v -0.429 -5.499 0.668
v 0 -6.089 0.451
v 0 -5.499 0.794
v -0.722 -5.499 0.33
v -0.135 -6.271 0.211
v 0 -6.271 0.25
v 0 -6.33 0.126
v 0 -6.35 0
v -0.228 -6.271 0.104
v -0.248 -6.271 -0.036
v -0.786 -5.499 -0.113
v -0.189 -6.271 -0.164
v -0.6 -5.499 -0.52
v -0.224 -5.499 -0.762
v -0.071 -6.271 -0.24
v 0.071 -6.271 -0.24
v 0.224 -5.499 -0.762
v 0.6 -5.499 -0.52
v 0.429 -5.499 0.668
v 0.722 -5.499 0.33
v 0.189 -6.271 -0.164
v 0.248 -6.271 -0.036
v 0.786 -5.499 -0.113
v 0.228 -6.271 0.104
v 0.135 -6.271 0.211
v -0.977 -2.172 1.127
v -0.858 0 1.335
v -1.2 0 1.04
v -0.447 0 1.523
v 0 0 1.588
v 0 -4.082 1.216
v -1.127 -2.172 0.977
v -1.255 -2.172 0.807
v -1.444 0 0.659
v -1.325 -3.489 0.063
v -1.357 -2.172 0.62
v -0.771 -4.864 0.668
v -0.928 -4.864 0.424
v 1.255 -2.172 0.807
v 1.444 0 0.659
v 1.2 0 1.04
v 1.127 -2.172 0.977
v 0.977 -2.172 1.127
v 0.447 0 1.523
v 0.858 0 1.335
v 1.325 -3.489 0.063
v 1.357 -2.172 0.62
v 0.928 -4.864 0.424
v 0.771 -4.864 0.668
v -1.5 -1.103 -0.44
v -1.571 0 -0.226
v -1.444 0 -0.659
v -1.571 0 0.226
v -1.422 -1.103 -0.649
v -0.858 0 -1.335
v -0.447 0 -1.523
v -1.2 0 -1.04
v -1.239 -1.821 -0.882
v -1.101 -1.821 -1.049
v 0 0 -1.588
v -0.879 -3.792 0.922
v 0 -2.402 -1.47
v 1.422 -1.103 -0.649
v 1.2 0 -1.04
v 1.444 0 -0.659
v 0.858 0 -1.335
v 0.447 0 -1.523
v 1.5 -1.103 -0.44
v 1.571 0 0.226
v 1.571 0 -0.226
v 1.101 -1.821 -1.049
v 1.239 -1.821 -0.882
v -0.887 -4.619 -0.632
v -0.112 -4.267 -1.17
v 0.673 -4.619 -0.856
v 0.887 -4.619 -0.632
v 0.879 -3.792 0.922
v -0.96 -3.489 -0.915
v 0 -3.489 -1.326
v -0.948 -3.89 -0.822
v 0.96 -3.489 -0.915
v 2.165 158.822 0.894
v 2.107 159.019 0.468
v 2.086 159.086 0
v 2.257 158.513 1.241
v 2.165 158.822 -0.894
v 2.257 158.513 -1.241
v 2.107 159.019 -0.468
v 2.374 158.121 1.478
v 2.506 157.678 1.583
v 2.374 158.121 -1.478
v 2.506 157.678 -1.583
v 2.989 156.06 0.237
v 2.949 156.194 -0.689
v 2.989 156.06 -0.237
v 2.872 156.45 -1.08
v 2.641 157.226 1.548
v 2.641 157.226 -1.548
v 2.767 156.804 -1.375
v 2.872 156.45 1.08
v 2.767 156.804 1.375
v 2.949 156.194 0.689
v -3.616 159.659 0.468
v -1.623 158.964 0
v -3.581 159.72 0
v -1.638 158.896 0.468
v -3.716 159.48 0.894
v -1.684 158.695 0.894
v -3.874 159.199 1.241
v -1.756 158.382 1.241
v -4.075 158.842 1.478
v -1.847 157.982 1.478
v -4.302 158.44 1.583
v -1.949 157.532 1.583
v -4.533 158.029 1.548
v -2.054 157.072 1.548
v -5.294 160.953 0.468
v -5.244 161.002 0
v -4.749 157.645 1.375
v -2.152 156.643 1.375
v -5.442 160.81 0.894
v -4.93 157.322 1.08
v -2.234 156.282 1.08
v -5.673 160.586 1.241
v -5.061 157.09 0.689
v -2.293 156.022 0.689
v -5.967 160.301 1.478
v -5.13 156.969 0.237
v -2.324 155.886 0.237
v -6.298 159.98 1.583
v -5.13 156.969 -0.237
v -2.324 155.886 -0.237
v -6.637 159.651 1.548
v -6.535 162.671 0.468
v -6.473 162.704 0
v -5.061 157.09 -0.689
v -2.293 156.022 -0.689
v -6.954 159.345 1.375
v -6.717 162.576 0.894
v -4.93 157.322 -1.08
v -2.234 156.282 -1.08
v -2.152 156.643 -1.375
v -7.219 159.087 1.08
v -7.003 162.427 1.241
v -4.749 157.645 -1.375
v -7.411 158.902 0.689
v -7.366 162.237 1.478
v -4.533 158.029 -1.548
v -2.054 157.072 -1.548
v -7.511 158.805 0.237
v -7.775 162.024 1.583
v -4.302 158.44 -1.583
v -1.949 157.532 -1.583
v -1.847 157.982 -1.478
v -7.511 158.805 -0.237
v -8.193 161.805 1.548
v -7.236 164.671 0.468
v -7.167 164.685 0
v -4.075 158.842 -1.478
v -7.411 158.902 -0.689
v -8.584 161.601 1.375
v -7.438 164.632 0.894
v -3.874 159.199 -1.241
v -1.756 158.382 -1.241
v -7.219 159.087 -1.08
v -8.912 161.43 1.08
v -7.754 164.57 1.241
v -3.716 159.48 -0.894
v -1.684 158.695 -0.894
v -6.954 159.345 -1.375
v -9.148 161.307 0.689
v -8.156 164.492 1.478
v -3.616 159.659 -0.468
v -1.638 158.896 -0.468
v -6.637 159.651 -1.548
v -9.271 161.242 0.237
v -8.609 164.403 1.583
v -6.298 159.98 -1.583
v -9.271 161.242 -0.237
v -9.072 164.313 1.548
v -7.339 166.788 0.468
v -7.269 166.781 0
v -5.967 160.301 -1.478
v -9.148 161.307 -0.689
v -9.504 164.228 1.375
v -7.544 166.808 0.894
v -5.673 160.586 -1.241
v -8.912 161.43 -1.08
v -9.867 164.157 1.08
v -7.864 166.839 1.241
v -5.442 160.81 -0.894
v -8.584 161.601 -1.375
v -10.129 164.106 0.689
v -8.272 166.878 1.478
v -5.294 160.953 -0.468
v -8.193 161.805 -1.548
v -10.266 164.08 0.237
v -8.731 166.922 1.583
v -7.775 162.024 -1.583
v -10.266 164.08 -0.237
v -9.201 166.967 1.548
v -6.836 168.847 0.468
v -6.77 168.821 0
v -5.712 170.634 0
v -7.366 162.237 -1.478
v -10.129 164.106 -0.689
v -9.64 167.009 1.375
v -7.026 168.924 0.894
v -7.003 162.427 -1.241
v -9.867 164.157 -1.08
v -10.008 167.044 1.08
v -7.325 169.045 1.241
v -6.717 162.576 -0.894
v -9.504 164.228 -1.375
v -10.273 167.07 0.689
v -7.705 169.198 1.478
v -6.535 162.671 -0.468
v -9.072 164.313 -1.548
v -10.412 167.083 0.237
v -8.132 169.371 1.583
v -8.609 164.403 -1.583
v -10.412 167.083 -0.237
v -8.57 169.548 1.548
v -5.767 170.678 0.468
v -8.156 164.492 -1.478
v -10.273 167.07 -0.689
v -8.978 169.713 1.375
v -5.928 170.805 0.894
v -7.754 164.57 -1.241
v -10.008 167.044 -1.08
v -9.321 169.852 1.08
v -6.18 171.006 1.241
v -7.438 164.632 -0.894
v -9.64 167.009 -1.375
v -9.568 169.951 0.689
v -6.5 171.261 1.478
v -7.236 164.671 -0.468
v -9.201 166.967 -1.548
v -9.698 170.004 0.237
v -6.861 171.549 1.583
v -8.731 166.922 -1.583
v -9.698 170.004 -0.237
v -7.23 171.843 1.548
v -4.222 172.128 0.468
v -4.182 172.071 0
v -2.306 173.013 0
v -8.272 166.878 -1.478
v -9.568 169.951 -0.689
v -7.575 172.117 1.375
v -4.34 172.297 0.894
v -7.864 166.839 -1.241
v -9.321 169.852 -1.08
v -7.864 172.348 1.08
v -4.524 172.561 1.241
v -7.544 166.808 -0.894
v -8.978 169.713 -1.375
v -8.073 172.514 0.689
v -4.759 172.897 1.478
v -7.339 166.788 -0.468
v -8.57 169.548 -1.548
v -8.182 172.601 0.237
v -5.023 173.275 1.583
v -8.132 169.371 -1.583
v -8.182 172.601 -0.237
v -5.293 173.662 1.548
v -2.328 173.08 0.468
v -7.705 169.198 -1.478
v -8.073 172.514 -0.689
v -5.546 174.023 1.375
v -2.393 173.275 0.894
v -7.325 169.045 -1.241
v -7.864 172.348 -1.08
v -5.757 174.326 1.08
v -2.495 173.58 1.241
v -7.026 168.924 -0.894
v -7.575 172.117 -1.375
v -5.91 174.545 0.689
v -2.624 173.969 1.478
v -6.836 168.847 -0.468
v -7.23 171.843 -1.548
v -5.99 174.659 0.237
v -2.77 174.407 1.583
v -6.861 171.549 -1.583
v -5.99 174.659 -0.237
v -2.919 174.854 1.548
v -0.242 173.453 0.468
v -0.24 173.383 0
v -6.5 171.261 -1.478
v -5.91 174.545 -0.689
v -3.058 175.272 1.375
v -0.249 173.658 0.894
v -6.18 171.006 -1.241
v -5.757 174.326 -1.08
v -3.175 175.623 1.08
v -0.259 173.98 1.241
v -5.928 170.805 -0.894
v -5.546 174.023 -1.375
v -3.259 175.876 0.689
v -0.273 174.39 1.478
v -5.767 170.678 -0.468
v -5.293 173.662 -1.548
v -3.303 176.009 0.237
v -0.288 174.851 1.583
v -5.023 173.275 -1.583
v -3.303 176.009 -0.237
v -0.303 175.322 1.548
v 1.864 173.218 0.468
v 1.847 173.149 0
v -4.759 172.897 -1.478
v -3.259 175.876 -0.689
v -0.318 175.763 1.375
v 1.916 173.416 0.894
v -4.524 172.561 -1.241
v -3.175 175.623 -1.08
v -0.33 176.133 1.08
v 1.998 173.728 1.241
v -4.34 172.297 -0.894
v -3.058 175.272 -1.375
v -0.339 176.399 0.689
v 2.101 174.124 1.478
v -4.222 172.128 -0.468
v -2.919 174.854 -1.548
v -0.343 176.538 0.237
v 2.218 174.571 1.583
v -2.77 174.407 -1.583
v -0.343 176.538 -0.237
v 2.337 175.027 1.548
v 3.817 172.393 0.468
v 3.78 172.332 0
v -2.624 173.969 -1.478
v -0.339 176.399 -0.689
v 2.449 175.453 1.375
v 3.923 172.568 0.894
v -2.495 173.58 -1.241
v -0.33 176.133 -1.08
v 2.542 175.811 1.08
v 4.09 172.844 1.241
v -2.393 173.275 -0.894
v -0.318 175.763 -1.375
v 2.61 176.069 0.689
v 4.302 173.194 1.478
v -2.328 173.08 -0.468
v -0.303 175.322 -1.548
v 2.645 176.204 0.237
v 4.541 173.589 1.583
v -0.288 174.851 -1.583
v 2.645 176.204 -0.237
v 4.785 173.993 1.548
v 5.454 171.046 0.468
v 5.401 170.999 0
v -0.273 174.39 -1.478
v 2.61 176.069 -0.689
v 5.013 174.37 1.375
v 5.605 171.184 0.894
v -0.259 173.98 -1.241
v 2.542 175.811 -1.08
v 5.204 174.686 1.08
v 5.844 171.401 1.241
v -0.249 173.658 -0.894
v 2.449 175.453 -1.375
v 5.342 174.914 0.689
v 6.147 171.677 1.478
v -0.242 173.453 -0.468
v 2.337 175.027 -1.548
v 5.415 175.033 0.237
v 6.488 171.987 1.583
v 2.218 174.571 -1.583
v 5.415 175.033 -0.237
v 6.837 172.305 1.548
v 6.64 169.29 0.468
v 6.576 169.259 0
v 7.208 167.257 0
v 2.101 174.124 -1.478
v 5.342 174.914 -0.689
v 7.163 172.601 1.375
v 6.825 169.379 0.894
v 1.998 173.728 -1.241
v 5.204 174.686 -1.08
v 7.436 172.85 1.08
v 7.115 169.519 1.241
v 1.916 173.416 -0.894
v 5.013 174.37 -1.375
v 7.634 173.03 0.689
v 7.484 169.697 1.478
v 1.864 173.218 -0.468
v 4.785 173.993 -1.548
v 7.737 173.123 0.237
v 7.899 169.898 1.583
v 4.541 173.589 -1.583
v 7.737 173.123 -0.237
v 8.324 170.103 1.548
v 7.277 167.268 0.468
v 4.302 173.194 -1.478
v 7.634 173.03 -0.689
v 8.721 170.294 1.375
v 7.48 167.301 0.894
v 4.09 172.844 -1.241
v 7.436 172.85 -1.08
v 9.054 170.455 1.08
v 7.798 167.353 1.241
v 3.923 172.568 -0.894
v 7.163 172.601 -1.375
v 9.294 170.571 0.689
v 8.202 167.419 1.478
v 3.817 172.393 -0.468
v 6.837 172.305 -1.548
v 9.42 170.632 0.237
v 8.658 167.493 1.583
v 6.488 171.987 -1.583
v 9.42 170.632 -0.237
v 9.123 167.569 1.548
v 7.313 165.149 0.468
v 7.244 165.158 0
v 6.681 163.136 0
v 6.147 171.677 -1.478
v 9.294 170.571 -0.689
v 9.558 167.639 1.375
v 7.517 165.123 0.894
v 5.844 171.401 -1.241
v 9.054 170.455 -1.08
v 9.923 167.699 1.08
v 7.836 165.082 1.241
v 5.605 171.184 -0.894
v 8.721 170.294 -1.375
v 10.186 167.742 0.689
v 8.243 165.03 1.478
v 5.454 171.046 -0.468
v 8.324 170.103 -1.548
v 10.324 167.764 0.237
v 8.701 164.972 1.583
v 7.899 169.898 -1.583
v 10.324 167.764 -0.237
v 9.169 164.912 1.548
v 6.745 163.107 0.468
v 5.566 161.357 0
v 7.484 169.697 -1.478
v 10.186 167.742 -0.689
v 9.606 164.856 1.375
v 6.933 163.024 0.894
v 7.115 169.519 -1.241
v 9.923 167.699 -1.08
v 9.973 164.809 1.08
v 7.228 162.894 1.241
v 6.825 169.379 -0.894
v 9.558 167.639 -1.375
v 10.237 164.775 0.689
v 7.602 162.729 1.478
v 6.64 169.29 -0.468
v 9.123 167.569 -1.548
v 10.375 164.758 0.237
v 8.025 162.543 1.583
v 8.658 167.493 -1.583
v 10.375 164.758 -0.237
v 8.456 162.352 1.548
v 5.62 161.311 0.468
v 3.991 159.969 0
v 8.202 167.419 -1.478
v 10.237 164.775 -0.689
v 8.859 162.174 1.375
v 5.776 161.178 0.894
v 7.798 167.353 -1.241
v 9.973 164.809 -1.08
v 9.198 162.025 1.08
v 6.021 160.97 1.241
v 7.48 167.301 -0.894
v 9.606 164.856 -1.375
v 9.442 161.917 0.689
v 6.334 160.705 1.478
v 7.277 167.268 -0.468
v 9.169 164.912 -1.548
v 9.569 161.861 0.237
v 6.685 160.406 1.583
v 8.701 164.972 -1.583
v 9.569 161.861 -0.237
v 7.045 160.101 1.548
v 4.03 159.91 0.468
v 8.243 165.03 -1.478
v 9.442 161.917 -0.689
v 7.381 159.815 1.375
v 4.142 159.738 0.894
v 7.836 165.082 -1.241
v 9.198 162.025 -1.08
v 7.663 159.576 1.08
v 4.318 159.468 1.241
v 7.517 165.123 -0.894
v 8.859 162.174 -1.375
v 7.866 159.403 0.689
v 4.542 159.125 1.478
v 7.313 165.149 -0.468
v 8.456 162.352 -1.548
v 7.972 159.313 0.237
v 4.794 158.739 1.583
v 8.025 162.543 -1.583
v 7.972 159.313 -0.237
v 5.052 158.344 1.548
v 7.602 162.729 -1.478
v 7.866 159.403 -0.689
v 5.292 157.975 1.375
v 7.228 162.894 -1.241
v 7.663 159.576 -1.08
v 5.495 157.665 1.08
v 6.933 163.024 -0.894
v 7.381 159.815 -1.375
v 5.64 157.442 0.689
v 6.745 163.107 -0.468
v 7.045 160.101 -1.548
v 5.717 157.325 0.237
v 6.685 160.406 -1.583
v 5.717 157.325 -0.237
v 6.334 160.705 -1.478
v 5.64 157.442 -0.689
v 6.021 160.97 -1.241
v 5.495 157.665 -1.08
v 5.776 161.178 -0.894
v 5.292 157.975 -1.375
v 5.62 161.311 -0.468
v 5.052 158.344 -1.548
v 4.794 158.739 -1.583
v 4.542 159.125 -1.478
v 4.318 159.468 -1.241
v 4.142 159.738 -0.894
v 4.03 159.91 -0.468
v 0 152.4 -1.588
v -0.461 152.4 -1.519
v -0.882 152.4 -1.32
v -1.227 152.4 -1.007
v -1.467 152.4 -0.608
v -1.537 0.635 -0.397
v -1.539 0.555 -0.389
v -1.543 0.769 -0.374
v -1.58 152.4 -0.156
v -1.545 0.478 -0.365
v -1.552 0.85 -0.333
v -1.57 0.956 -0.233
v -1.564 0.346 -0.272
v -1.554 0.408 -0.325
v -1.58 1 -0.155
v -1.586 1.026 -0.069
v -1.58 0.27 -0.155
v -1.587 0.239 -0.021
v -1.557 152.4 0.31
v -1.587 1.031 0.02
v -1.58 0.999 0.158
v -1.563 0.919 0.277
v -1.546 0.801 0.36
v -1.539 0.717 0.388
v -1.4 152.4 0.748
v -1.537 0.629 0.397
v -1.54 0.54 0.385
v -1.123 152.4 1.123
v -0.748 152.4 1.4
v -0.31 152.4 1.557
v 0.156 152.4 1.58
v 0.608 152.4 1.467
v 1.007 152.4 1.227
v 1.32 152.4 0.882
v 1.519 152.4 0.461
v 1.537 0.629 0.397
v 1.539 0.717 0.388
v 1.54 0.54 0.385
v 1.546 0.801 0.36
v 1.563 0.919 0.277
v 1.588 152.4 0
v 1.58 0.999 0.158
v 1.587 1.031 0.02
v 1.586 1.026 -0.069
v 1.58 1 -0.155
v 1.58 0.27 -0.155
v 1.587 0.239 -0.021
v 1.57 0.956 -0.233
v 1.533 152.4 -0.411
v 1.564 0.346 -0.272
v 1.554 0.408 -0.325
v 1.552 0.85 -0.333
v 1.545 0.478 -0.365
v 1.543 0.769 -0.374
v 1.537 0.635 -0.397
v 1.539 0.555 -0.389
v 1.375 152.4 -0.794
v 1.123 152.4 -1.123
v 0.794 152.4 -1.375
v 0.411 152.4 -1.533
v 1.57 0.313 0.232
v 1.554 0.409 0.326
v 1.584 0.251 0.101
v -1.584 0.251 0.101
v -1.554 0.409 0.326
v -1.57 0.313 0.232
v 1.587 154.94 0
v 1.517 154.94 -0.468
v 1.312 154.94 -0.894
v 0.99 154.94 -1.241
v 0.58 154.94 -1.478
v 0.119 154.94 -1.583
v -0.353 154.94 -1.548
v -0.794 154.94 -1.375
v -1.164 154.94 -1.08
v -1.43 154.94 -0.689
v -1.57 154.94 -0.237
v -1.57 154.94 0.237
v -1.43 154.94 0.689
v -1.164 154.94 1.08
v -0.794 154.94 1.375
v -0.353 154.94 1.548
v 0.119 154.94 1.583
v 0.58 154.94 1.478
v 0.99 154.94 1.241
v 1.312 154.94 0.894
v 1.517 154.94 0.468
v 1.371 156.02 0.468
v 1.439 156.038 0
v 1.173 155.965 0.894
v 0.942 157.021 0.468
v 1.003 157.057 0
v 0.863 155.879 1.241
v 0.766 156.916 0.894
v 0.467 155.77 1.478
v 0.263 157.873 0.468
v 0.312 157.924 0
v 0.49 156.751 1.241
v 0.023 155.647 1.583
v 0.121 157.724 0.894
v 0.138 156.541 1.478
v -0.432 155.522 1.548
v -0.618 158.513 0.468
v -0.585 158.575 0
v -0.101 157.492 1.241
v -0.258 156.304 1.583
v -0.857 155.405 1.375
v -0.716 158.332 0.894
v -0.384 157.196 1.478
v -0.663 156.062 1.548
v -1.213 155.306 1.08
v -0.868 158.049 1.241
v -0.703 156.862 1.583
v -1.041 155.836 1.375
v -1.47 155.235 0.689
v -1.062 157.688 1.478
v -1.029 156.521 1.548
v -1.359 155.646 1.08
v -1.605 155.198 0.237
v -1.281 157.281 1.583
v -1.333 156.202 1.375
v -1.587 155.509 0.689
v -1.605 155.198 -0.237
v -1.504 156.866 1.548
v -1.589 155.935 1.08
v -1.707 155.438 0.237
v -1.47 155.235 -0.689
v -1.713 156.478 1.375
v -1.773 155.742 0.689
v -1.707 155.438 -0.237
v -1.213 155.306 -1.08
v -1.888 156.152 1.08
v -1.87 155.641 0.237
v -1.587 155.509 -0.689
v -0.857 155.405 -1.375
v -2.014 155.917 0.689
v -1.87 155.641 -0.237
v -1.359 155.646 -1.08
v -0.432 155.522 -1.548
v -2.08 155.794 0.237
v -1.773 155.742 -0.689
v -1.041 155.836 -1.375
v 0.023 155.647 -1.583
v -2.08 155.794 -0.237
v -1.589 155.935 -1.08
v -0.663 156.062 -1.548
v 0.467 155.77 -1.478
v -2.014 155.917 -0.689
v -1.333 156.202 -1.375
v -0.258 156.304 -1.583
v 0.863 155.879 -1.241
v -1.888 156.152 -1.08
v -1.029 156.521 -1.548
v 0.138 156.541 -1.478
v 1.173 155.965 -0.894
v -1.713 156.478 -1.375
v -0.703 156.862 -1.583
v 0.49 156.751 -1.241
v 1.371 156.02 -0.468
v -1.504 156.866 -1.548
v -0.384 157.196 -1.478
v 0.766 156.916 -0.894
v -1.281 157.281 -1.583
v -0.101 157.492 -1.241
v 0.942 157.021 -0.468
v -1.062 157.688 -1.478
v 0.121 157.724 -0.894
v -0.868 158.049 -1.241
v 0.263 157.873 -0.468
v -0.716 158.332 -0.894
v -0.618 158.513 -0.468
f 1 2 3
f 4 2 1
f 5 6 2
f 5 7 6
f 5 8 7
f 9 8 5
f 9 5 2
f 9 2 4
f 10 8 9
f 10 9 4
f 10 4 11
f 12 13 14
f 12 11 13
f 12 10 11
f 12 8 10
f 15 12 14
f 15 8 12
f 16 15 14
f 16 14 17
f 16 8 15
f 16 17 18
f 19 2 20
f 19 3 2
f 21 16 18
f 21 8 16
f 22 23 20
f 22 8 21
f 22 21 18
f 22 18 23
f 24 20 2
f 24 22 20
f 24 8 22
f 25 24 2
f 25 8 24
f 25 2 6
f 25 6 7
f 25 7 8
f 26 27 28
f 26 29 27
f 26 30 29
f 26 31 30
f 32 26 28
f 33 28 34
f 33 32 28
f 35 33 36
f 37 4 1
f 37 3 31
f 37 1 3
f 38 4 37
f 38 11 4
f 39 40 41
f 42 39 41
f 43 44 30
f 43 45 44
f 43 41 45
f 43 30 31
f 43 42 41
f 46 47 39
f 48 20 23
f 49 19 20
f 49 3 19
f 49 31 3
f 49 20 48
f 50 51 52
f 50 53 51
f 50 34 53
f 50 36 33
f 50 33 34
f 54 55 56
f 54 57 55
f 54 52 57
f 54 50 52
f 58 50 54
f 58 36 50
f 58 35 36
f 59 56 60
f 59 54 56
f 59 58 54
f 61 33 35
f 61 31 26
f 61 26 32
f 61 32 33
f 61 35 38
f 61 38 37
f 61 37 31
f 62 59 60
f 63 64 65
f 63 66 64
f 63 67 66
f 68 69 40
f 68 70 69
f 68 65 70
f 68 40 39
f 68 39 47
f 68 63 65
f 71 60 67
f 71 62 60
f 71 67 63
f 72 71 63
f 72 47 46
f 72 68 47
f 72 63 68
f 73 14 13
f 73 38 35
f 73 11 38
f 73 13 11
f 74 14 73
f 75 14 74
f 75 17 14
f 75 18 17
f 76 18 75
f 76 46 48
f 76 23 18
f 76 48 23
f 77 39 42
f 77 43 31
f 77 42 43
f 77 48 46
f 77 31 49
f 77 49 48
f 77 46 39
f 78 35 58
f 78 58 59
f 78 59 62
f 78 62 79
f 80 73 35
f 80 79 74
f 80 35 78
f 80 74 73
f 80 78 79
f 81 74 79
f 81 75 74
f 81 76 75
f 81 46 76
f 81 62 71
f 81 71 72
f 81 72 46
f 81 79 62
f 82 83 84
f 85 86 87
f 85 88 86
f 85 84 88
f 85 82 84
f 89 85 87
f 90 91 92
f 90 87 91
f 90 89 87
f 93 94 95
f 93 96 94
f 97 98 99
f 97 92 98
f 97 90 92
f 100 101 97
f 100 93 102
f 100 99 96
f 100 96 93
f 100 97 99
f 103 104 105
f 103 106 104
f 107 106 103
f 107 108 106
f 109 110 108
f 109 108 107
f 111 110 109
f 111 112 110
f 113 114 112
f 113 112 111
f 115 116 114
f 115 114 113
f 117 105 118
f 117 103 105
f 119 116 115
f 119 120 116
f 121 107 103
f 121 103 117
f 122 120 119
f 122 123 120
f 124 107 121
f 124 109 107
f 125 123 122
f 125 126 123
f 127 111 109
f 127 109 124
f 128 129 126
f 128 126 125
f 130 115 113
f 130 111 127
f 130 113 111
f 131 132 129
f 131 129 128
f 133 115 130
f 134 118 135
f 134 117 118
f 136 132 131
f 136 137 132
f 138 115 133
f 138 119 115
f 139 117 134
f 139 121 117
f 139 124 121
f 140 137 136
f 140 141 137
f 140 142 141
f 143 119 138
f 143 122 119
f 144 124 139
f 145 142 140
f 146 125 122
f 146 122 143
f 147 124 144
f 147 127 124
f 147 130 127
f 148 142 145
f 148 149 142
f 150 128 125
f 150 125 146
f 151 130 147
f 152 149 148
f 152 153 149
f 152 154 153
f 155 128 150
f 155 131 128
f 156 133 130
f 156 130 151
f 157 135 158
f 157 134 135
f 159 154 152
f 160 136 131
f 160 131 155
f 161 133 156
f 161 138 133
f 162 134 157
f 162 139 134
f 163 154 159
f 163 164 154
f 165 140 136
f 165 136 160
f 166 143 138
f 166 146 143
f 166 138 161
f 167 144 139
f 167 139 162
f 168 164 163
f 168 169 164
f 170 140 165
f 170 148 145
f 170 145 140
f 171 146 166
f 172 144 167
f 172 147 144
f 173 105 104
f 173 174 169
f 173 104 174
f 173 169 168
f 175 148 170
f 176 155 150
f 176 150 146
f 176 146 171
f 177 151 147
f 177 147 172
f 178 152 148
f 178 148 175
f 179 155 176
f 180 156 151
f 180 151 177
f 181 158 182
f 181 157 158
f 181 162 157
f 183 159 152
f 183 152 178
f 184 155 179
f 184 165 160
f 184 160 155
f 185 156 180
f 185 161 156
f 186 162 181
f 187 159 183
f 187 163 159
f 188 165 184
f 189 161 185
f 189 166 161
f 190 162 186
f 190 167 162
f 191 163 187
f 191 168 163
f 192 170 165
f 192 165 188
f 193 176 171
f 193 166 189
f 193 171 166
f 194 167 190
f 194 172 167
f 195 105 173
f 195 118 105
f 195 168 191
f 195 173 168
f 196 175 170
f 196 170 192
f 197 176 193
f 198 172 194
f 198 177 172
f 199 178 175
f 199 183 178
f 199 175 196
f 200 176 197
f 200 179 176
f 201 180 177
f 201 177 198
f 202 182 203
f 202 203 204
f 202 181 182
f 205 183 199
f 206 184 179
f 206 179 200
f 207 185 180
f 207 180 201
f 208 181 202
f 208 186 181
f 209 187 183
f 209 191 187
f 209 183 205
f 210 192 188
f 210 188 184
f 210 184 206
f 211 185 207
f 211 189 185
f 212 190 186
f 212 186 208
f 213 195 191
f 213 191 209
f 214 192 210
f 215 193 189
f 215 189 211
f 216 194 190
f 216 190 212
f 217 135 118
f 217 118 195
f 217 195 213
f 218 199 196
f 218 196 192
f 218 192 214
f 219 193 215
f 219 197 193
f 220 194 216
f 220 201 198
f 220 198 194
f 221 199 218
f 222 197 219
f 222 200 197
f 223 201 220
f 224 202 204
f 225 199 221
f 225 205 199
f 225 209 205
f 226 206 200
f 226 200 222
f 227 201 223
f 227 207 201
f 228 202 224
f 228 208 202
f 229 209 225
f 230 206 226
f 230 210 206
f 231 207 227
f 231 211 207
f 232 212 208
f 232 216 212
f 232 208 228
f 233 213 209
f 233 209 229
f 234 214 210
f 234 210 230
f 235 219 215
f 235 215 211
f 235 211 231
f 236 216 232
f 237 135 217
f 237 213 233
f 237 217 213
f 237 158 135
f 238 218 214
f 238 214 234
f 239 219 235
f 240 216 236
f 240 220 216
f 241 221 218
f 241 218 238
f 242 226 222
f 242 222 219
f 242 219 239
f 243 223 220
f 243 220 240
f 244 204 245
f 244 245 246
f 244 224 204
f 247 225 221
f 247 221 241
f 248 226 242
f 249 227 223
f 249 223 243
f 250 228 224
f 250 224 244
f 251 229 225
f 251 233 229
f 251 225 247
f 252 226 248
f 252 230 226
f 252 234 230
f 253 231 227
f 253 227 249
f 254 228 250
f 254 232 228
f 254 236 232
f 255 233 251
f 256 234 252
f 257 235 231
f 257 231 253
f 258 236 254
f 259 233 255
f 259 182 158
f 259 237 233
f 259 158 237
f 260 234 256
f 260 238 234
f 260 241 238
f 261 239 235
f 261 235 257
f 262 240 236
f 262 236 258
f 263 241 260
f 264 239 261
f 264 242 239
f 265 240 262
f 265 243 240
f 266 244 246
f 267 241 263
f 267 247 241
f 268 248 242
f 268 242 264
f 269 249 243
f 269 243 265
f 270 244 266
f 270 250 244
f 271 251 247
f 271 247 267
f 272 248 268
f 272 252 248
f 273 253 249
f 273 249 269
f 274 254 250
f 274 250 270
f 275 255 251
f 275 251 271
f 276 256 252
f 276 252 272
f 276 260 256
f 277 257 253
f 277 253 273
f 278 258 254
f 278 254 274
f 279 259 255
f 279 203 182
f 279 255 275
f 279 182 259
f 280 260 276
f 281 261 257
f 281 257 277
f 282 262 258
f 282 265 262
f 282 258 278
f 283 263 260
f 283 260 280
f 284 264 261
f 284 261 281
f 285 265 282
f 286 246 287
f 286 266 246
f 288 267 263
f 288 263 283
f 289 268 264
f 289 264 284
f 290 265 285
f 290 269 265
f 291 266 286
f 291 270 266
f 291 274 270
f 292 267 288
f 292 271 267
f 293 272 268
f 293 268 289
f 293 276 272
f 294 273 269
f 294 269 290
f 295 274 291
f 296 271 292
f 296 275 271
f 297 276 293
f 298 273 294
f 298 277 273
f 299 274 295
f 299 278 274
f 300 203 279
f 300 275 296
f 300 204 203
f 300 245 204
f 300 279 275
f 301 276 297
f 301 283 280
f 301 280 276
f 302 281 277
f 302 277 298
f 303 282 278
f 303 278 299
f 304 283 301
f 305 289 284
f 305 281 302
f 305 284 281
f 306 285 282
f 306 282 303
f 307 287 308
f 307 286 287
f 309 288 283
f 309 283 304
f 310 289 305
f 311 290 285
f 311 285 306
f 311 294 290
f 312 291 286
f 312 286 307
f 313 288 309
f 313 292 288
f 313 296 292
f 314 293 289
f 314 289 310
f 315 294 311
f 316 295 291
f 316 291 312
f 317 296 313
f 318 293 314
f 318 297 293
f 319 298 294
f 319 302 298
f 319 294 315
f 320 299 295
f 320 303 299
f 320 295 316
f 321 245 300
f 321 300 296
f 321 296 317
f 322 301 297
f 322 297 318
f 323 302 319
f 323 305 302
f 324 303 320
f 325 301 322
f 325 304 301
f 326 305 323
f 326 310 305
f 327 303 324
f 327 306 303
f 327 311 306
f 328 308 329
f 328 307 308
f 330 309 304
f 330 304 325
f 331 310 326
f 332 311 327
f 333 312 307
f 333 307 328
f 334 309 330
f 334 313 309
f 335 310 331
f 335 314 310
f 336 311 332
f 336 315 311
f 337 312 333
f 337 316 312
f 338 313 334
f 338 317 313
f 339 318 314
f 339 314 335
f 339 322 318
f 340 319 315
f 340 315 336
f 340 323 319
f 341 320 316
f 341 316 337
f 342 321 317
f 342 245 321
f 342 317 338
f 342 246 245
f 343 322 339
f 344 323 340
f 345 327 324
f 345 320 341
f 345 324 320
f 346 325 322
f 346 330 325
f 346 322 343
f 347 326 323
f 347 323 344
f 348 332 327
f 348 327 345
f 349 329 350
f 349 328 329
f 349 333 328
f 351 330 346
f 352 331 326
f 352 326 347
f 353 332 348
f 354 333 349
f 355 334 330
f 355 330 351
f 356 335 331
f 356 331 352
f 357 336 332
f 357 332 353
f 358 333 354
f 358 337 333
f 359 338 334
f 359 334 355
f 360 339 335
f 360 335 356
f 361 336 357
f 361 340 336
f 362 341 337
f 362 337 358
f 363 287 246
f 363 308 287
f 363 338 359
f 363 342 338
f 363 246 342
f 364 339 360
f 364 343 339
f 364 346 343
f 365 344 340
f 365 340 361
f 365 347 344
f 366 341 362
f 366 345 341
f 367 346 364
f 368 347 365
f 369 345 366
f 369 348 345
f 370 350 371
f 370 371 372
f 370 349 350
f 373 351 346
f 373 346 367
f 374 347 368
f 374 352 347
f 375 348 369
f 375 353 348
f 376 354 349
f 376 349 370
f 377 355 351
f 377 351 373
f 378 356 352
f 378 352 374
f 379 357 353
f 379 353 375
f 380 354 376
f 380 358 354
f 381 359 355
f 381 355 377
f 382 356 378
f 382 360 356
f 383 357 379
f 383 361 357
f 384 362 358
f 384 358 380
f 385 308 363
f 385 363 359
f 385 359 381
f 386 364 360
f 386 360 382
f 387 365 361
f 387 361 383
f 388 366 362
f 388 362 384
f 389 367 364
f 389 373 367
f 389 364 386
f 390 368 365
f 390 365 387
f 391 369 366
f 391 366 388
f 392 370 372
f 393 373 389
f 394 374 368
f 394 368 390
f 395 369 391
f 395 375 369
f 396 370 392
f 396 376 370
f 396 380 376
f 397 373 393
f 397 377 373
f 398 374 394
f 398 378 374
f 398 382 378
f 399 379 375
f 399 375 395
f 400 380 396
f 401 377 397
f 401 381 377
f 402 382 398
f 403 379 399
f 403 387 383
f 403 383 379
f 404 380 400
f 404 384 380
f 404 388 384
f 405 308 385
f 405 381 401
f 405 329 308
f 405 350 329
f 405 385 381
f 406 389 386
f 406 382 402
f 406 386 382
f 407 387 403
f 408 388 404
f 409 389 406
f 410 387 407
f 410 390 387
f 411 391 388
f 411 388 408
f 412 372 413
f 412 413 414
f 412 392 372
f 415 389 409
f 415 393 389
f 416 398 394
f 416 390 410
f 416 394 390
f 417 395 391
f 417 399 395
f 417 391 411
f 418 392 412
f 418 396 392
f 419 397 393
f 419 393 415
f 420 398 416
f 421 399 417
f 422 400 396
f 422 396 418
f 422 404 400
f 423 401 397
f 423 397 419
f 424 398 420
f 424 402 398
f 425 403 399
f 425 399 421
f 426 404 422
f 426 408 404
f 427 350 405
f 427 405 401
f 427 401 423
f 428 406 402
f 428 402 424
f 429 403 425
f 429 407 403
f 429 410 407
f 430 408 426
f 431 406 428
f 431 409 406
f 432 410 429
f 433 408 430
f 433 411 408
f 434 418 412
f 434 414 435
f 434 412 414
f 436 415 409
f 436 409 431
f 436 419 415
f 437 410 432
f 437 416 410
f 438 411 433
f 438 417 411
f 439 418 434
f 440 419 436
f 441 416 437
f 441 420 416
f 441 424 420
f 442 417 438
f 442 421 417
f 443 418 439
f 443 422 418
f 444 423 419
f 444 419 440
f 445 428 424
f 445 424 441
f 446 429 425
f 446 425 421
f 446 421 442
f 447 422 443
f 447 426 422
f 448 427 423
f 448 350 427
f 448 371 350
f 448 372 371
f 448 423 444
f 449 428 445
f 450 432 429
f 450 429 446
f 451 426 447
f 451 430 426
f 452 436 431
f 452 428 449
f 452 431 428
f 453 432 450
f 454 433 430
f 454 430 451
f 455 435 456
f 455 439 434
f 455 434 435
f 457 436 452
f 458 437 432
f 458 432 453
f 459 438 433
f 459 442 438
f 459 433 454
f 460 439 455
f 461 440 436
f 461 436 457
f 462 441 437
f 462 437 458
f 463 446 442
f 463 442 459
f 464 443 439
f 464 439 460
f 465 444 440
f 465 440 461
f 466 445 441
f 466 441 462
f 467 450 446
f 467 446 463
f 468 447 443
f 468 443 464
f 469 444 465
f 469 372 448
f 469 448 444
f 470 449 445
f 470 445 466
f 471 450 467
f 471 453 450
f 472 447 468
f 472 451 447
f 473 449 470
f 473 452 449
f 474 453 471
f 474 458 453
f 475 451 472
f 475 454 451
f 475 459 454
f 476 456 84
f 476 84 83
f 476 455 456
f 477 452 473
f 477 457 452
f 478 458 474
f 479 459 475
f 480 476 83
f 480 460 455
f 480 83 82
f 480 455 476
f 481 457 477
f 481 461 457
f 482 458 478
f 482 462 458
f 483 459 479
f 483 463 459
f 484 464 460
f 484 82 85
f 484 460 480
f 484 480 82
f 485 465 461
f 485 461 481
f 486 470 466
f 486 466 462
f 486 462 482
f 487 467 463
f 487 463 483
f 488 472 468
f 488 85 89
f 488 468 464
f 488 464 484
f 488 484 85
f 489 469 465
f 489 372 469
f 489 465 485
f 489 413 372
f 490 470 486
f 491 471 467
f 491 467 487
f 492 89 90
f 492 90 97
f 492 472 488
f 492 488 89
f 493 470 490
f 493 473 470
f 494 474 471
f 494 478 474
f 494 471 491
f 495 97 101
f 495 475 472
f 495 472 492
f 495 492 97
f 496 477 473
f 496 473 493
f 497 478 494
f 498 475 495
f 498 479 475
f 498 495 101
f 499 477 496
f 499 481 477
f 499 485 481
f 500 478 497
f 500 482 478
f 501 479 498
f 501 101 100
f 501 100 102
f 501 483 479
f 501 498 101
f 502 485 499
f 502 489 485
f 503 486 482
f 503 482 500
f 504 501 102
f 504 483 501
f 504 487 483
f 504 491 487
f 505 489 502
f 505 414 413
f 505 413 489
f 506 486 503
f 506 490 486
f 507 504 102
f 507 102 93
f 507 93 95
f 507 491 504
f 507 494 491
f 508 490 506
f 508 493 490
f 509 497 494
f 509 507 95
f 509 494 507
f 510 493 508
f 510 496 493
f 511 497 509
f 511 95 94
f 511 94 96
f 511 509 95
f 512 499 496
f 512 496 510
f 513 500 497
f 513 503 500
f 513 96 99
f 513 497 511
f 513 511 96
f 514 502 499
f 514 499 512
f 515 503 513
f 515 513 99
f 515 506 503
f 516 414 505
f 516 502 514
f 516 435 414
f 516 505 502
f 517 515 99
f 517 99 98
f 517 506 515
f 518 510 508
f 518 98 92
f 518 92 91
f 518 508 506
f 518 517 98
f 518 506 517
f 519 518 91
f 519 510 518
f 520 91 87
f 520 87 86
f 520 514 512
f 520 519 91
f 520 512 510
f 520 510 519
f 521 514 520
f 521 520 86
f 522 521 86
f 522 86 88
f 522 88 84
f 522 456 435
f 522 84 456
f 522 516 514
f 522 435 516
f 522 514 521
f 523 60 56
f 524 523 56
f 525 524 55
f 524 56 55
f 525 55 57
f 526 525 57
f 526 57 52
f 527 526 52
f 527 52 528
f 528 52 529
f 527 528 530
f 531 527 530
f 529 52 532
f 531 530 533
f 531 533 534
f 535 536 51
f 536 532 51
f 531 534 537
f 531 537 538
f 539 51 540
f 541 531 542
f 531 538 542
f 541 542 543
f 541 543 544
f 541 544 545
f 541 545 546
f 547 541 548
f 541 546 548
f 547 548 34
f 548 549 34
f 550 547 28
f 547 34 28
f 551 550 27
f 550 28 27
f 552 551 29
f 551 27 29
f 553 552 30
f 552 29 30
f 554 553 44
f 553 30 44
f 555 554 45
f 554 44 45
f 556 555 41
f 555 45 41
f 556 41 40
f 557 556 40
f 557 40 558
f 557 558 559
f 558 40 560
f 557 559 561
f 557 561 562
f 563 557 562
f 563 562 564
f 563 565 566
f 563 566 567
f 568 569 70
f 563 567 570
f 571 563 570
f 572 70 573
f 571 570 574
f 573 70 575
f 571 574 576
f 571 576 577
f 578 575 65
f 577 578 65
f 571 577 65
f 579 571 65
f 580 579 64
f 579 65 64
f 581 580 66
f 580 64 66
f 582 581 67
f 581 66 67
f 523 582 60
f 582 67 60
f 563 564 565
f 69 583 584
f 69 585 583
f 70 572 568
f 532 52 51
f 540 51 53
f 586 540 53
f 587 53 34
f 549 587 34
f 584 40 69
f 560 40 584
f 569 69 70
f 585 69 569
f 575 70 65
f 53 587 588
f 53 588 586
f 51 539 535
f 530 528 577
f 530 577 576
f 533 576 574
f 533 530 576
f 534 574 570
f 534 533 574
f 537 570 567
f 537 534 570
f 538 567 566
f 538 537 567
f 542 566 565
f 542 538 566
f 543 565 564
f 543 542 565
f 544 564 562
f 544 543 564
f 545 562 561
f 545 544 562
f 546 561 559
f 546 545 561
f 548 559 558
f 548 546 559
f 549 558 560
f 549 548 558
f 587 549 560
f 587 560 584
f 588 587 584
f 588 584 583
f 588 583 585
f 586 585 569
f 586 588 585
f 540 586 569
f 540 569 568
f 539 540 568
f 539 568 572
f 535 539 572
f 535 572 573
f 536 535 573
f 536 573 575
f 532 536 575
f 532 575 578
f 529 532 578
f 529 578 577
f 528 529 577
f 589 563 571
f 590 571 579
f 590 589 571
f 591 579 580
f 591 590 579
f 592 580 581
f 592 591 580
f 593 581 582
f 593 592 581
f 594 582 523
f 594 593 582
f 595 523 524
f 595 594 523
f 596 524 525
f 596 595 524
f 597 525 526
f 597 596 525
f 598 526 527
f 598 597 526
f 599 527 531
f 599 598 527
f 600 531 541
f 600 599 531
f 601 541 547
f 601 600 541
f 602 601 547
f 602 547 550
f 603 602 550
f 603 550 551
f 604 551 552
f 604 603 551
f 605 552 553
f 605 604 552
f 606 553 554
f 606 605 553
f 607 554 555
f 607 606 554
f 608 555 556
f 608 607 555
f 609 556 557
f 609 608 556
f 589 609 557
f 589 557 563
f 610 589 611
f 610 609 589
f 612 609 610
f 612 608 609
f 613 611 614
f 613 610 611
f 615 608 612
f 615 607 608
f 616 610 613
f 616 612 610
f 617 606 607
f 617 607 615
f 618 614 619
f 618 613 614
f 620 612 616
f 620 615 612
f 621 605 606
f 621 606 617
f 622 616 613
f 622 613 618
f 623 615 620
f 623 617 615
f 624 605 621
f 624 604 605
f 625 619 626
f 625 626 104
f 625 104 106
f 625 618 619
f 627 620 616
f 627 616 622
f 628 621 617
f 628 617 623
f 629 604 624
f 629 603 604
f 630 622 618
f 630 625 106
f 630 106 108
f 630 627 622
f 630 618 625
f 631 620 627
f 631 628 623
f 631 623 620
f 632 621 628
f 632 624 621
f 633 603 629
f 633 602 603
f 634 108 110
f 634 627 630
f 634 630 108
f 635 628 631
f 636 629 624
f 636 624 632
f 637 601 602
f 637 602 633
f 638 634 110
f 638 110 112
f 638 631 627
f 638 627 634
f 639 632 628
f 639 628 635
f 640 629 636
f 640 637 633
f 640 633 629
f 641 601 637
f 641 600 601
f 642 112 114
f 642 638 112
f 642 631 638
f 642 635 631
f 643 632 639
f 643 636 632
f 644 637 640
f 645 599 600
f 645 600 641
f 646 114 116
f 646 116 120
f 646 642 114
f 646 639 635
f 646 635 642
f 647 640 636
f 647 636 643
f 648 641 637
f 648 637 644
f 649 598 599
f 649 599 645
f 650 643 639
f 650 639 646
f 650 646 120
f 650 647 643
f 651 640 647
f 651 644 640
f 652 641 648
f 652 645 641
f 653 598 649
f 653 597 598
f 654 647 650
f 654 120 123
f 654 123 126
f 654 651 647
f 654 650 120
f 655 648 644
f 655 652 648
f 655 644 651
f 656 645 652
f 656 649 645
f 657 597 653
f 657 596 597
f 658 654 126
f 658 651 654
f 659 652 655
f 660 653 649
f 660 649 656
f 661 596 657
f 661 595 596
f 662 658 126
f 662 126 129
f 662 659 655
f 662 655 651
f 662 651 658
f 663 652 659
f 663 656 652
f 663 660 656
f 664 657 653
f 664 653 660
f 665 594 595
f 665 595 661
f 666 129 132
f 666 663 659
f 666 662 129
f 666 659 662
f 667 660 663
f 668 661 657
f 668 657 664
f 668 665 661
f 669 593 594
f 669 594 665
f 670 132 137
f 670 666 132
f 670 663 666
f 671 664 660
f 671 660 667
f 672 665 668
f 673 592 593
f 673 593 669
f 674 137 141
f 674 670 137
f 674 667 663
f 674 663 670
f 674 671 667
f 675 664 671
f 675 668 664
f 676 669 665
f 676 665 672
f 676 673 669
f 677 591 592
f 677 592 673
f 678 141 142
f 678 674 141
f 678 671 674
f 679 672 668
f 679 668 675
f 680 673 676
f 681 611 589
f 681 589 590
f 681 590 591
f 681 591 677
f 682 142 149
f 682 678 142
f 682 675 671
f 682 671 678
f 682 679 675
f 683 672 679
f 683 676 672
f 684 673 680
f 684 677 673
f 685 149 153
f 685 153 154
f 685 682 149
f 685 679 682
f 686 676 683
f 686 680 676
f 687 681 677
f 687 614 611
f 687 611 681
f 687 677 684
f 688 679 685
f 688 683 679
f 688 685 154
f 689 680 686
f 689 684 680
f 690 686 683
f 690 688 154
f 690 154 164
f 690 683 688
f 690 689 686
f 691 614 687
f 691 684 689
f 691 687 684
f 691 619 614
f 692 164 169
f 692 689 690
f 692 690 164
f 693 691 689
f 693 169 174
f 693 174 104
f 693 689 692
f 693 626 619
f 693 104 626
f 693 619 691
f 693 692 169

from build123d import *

# Parameters (mm, degrees)
SKETCH1_R               = 1.5875
BOSS_EXTRUDE1_DEPTH     = 152.4
SKETCH3_R               = 1.5875
DOME1_FACE_RADIUS       = 1.5875
DOME1_HEIGHT            = 6.35
CUT_EXTRUDE1_DEPTH      = 177.879432926
CUT_EXTRUDE1_DEPTH_BACK = 177.879432926
SKETCH5_R               = 0.396875


with BuildPart() as part:
    # Sketch1 → Boss-Extrude1 (new body)
    with BuildSketch(Plane(origin=(0, 0, 0), x_dir=(1, 0, 0), z_dir=(0, 1, 0))):
        Circle(SKETCH1_R)
    extrude(amount=BOSS_EXTRUDE1_DEPTH)

    # Sweep1: sweep along a path in Sketch2
    with BuildLine(Plane.XY) as sweep1_path:
        Line((0, 152.4), (0, 154.94))
        ThreePointArc((0, 154.94), (-0.554390662, 156.523968294), (-1.975555556, 157.416489949))
        ThreePointArc((-1.975555556, 157.416489949), (-0.291800096, 174.969414545), (2.54, 157.564785778))
    # Sketch3 → Sweep1 (sweep)
    with BuildSketch(Plane(origin=(0, 152.4, 0), x_dir=(1, 0, 0), z_dir=(0, 1, 0))):
        Circle(SKETCH3_R)
    sweep(path=sweep1_path.line)

    # Dome1: an elliptical dome of height H over a round flat face of radius A is half a spheroid: the quarter ellipse of half axes A and H revolved about the face's axis
    with BuildSketch(Plane((0, 0, 0), x_dir=(0, 0, 1), z_dir=(1, 0, 0)), mode=Mode.PRIVATE) as dome1_quarter:
        Ellipse(DOME1_FACE_RADIUS, DOME1_HEIGHT)
        Rectangle(DOME1_FACE_RADIUS, DOME1_HEIGHT, align=(Align.MIN, Align.MIN), mode=Mode.INTERSECT)
    revolve(dome1_quarter.sketch, axis=Axis((0, 0, 0), (0, -1, 0)))

    # Sketch5 → Cut-Extrude1 (cut, two sides: drawn at the far end of the back side and taken through both)
    with BuildSketch(Plane(origin=(0, 0, 0), x_dir=(0, 0, -1), z_dir=(1, 0, 0)).offset(-CUT_EXTRUDE1_DEPTH_BACK)):
        with Locations((0, 0.635)):
            Circle(SKETCH5_R)
    extrude(amount=CUT_EXTRUDE1_DEPTH + CUT_EXTRUDE1_DEPTH_BACK, mode=Mode.SUBTRACT)


solid = part.part
